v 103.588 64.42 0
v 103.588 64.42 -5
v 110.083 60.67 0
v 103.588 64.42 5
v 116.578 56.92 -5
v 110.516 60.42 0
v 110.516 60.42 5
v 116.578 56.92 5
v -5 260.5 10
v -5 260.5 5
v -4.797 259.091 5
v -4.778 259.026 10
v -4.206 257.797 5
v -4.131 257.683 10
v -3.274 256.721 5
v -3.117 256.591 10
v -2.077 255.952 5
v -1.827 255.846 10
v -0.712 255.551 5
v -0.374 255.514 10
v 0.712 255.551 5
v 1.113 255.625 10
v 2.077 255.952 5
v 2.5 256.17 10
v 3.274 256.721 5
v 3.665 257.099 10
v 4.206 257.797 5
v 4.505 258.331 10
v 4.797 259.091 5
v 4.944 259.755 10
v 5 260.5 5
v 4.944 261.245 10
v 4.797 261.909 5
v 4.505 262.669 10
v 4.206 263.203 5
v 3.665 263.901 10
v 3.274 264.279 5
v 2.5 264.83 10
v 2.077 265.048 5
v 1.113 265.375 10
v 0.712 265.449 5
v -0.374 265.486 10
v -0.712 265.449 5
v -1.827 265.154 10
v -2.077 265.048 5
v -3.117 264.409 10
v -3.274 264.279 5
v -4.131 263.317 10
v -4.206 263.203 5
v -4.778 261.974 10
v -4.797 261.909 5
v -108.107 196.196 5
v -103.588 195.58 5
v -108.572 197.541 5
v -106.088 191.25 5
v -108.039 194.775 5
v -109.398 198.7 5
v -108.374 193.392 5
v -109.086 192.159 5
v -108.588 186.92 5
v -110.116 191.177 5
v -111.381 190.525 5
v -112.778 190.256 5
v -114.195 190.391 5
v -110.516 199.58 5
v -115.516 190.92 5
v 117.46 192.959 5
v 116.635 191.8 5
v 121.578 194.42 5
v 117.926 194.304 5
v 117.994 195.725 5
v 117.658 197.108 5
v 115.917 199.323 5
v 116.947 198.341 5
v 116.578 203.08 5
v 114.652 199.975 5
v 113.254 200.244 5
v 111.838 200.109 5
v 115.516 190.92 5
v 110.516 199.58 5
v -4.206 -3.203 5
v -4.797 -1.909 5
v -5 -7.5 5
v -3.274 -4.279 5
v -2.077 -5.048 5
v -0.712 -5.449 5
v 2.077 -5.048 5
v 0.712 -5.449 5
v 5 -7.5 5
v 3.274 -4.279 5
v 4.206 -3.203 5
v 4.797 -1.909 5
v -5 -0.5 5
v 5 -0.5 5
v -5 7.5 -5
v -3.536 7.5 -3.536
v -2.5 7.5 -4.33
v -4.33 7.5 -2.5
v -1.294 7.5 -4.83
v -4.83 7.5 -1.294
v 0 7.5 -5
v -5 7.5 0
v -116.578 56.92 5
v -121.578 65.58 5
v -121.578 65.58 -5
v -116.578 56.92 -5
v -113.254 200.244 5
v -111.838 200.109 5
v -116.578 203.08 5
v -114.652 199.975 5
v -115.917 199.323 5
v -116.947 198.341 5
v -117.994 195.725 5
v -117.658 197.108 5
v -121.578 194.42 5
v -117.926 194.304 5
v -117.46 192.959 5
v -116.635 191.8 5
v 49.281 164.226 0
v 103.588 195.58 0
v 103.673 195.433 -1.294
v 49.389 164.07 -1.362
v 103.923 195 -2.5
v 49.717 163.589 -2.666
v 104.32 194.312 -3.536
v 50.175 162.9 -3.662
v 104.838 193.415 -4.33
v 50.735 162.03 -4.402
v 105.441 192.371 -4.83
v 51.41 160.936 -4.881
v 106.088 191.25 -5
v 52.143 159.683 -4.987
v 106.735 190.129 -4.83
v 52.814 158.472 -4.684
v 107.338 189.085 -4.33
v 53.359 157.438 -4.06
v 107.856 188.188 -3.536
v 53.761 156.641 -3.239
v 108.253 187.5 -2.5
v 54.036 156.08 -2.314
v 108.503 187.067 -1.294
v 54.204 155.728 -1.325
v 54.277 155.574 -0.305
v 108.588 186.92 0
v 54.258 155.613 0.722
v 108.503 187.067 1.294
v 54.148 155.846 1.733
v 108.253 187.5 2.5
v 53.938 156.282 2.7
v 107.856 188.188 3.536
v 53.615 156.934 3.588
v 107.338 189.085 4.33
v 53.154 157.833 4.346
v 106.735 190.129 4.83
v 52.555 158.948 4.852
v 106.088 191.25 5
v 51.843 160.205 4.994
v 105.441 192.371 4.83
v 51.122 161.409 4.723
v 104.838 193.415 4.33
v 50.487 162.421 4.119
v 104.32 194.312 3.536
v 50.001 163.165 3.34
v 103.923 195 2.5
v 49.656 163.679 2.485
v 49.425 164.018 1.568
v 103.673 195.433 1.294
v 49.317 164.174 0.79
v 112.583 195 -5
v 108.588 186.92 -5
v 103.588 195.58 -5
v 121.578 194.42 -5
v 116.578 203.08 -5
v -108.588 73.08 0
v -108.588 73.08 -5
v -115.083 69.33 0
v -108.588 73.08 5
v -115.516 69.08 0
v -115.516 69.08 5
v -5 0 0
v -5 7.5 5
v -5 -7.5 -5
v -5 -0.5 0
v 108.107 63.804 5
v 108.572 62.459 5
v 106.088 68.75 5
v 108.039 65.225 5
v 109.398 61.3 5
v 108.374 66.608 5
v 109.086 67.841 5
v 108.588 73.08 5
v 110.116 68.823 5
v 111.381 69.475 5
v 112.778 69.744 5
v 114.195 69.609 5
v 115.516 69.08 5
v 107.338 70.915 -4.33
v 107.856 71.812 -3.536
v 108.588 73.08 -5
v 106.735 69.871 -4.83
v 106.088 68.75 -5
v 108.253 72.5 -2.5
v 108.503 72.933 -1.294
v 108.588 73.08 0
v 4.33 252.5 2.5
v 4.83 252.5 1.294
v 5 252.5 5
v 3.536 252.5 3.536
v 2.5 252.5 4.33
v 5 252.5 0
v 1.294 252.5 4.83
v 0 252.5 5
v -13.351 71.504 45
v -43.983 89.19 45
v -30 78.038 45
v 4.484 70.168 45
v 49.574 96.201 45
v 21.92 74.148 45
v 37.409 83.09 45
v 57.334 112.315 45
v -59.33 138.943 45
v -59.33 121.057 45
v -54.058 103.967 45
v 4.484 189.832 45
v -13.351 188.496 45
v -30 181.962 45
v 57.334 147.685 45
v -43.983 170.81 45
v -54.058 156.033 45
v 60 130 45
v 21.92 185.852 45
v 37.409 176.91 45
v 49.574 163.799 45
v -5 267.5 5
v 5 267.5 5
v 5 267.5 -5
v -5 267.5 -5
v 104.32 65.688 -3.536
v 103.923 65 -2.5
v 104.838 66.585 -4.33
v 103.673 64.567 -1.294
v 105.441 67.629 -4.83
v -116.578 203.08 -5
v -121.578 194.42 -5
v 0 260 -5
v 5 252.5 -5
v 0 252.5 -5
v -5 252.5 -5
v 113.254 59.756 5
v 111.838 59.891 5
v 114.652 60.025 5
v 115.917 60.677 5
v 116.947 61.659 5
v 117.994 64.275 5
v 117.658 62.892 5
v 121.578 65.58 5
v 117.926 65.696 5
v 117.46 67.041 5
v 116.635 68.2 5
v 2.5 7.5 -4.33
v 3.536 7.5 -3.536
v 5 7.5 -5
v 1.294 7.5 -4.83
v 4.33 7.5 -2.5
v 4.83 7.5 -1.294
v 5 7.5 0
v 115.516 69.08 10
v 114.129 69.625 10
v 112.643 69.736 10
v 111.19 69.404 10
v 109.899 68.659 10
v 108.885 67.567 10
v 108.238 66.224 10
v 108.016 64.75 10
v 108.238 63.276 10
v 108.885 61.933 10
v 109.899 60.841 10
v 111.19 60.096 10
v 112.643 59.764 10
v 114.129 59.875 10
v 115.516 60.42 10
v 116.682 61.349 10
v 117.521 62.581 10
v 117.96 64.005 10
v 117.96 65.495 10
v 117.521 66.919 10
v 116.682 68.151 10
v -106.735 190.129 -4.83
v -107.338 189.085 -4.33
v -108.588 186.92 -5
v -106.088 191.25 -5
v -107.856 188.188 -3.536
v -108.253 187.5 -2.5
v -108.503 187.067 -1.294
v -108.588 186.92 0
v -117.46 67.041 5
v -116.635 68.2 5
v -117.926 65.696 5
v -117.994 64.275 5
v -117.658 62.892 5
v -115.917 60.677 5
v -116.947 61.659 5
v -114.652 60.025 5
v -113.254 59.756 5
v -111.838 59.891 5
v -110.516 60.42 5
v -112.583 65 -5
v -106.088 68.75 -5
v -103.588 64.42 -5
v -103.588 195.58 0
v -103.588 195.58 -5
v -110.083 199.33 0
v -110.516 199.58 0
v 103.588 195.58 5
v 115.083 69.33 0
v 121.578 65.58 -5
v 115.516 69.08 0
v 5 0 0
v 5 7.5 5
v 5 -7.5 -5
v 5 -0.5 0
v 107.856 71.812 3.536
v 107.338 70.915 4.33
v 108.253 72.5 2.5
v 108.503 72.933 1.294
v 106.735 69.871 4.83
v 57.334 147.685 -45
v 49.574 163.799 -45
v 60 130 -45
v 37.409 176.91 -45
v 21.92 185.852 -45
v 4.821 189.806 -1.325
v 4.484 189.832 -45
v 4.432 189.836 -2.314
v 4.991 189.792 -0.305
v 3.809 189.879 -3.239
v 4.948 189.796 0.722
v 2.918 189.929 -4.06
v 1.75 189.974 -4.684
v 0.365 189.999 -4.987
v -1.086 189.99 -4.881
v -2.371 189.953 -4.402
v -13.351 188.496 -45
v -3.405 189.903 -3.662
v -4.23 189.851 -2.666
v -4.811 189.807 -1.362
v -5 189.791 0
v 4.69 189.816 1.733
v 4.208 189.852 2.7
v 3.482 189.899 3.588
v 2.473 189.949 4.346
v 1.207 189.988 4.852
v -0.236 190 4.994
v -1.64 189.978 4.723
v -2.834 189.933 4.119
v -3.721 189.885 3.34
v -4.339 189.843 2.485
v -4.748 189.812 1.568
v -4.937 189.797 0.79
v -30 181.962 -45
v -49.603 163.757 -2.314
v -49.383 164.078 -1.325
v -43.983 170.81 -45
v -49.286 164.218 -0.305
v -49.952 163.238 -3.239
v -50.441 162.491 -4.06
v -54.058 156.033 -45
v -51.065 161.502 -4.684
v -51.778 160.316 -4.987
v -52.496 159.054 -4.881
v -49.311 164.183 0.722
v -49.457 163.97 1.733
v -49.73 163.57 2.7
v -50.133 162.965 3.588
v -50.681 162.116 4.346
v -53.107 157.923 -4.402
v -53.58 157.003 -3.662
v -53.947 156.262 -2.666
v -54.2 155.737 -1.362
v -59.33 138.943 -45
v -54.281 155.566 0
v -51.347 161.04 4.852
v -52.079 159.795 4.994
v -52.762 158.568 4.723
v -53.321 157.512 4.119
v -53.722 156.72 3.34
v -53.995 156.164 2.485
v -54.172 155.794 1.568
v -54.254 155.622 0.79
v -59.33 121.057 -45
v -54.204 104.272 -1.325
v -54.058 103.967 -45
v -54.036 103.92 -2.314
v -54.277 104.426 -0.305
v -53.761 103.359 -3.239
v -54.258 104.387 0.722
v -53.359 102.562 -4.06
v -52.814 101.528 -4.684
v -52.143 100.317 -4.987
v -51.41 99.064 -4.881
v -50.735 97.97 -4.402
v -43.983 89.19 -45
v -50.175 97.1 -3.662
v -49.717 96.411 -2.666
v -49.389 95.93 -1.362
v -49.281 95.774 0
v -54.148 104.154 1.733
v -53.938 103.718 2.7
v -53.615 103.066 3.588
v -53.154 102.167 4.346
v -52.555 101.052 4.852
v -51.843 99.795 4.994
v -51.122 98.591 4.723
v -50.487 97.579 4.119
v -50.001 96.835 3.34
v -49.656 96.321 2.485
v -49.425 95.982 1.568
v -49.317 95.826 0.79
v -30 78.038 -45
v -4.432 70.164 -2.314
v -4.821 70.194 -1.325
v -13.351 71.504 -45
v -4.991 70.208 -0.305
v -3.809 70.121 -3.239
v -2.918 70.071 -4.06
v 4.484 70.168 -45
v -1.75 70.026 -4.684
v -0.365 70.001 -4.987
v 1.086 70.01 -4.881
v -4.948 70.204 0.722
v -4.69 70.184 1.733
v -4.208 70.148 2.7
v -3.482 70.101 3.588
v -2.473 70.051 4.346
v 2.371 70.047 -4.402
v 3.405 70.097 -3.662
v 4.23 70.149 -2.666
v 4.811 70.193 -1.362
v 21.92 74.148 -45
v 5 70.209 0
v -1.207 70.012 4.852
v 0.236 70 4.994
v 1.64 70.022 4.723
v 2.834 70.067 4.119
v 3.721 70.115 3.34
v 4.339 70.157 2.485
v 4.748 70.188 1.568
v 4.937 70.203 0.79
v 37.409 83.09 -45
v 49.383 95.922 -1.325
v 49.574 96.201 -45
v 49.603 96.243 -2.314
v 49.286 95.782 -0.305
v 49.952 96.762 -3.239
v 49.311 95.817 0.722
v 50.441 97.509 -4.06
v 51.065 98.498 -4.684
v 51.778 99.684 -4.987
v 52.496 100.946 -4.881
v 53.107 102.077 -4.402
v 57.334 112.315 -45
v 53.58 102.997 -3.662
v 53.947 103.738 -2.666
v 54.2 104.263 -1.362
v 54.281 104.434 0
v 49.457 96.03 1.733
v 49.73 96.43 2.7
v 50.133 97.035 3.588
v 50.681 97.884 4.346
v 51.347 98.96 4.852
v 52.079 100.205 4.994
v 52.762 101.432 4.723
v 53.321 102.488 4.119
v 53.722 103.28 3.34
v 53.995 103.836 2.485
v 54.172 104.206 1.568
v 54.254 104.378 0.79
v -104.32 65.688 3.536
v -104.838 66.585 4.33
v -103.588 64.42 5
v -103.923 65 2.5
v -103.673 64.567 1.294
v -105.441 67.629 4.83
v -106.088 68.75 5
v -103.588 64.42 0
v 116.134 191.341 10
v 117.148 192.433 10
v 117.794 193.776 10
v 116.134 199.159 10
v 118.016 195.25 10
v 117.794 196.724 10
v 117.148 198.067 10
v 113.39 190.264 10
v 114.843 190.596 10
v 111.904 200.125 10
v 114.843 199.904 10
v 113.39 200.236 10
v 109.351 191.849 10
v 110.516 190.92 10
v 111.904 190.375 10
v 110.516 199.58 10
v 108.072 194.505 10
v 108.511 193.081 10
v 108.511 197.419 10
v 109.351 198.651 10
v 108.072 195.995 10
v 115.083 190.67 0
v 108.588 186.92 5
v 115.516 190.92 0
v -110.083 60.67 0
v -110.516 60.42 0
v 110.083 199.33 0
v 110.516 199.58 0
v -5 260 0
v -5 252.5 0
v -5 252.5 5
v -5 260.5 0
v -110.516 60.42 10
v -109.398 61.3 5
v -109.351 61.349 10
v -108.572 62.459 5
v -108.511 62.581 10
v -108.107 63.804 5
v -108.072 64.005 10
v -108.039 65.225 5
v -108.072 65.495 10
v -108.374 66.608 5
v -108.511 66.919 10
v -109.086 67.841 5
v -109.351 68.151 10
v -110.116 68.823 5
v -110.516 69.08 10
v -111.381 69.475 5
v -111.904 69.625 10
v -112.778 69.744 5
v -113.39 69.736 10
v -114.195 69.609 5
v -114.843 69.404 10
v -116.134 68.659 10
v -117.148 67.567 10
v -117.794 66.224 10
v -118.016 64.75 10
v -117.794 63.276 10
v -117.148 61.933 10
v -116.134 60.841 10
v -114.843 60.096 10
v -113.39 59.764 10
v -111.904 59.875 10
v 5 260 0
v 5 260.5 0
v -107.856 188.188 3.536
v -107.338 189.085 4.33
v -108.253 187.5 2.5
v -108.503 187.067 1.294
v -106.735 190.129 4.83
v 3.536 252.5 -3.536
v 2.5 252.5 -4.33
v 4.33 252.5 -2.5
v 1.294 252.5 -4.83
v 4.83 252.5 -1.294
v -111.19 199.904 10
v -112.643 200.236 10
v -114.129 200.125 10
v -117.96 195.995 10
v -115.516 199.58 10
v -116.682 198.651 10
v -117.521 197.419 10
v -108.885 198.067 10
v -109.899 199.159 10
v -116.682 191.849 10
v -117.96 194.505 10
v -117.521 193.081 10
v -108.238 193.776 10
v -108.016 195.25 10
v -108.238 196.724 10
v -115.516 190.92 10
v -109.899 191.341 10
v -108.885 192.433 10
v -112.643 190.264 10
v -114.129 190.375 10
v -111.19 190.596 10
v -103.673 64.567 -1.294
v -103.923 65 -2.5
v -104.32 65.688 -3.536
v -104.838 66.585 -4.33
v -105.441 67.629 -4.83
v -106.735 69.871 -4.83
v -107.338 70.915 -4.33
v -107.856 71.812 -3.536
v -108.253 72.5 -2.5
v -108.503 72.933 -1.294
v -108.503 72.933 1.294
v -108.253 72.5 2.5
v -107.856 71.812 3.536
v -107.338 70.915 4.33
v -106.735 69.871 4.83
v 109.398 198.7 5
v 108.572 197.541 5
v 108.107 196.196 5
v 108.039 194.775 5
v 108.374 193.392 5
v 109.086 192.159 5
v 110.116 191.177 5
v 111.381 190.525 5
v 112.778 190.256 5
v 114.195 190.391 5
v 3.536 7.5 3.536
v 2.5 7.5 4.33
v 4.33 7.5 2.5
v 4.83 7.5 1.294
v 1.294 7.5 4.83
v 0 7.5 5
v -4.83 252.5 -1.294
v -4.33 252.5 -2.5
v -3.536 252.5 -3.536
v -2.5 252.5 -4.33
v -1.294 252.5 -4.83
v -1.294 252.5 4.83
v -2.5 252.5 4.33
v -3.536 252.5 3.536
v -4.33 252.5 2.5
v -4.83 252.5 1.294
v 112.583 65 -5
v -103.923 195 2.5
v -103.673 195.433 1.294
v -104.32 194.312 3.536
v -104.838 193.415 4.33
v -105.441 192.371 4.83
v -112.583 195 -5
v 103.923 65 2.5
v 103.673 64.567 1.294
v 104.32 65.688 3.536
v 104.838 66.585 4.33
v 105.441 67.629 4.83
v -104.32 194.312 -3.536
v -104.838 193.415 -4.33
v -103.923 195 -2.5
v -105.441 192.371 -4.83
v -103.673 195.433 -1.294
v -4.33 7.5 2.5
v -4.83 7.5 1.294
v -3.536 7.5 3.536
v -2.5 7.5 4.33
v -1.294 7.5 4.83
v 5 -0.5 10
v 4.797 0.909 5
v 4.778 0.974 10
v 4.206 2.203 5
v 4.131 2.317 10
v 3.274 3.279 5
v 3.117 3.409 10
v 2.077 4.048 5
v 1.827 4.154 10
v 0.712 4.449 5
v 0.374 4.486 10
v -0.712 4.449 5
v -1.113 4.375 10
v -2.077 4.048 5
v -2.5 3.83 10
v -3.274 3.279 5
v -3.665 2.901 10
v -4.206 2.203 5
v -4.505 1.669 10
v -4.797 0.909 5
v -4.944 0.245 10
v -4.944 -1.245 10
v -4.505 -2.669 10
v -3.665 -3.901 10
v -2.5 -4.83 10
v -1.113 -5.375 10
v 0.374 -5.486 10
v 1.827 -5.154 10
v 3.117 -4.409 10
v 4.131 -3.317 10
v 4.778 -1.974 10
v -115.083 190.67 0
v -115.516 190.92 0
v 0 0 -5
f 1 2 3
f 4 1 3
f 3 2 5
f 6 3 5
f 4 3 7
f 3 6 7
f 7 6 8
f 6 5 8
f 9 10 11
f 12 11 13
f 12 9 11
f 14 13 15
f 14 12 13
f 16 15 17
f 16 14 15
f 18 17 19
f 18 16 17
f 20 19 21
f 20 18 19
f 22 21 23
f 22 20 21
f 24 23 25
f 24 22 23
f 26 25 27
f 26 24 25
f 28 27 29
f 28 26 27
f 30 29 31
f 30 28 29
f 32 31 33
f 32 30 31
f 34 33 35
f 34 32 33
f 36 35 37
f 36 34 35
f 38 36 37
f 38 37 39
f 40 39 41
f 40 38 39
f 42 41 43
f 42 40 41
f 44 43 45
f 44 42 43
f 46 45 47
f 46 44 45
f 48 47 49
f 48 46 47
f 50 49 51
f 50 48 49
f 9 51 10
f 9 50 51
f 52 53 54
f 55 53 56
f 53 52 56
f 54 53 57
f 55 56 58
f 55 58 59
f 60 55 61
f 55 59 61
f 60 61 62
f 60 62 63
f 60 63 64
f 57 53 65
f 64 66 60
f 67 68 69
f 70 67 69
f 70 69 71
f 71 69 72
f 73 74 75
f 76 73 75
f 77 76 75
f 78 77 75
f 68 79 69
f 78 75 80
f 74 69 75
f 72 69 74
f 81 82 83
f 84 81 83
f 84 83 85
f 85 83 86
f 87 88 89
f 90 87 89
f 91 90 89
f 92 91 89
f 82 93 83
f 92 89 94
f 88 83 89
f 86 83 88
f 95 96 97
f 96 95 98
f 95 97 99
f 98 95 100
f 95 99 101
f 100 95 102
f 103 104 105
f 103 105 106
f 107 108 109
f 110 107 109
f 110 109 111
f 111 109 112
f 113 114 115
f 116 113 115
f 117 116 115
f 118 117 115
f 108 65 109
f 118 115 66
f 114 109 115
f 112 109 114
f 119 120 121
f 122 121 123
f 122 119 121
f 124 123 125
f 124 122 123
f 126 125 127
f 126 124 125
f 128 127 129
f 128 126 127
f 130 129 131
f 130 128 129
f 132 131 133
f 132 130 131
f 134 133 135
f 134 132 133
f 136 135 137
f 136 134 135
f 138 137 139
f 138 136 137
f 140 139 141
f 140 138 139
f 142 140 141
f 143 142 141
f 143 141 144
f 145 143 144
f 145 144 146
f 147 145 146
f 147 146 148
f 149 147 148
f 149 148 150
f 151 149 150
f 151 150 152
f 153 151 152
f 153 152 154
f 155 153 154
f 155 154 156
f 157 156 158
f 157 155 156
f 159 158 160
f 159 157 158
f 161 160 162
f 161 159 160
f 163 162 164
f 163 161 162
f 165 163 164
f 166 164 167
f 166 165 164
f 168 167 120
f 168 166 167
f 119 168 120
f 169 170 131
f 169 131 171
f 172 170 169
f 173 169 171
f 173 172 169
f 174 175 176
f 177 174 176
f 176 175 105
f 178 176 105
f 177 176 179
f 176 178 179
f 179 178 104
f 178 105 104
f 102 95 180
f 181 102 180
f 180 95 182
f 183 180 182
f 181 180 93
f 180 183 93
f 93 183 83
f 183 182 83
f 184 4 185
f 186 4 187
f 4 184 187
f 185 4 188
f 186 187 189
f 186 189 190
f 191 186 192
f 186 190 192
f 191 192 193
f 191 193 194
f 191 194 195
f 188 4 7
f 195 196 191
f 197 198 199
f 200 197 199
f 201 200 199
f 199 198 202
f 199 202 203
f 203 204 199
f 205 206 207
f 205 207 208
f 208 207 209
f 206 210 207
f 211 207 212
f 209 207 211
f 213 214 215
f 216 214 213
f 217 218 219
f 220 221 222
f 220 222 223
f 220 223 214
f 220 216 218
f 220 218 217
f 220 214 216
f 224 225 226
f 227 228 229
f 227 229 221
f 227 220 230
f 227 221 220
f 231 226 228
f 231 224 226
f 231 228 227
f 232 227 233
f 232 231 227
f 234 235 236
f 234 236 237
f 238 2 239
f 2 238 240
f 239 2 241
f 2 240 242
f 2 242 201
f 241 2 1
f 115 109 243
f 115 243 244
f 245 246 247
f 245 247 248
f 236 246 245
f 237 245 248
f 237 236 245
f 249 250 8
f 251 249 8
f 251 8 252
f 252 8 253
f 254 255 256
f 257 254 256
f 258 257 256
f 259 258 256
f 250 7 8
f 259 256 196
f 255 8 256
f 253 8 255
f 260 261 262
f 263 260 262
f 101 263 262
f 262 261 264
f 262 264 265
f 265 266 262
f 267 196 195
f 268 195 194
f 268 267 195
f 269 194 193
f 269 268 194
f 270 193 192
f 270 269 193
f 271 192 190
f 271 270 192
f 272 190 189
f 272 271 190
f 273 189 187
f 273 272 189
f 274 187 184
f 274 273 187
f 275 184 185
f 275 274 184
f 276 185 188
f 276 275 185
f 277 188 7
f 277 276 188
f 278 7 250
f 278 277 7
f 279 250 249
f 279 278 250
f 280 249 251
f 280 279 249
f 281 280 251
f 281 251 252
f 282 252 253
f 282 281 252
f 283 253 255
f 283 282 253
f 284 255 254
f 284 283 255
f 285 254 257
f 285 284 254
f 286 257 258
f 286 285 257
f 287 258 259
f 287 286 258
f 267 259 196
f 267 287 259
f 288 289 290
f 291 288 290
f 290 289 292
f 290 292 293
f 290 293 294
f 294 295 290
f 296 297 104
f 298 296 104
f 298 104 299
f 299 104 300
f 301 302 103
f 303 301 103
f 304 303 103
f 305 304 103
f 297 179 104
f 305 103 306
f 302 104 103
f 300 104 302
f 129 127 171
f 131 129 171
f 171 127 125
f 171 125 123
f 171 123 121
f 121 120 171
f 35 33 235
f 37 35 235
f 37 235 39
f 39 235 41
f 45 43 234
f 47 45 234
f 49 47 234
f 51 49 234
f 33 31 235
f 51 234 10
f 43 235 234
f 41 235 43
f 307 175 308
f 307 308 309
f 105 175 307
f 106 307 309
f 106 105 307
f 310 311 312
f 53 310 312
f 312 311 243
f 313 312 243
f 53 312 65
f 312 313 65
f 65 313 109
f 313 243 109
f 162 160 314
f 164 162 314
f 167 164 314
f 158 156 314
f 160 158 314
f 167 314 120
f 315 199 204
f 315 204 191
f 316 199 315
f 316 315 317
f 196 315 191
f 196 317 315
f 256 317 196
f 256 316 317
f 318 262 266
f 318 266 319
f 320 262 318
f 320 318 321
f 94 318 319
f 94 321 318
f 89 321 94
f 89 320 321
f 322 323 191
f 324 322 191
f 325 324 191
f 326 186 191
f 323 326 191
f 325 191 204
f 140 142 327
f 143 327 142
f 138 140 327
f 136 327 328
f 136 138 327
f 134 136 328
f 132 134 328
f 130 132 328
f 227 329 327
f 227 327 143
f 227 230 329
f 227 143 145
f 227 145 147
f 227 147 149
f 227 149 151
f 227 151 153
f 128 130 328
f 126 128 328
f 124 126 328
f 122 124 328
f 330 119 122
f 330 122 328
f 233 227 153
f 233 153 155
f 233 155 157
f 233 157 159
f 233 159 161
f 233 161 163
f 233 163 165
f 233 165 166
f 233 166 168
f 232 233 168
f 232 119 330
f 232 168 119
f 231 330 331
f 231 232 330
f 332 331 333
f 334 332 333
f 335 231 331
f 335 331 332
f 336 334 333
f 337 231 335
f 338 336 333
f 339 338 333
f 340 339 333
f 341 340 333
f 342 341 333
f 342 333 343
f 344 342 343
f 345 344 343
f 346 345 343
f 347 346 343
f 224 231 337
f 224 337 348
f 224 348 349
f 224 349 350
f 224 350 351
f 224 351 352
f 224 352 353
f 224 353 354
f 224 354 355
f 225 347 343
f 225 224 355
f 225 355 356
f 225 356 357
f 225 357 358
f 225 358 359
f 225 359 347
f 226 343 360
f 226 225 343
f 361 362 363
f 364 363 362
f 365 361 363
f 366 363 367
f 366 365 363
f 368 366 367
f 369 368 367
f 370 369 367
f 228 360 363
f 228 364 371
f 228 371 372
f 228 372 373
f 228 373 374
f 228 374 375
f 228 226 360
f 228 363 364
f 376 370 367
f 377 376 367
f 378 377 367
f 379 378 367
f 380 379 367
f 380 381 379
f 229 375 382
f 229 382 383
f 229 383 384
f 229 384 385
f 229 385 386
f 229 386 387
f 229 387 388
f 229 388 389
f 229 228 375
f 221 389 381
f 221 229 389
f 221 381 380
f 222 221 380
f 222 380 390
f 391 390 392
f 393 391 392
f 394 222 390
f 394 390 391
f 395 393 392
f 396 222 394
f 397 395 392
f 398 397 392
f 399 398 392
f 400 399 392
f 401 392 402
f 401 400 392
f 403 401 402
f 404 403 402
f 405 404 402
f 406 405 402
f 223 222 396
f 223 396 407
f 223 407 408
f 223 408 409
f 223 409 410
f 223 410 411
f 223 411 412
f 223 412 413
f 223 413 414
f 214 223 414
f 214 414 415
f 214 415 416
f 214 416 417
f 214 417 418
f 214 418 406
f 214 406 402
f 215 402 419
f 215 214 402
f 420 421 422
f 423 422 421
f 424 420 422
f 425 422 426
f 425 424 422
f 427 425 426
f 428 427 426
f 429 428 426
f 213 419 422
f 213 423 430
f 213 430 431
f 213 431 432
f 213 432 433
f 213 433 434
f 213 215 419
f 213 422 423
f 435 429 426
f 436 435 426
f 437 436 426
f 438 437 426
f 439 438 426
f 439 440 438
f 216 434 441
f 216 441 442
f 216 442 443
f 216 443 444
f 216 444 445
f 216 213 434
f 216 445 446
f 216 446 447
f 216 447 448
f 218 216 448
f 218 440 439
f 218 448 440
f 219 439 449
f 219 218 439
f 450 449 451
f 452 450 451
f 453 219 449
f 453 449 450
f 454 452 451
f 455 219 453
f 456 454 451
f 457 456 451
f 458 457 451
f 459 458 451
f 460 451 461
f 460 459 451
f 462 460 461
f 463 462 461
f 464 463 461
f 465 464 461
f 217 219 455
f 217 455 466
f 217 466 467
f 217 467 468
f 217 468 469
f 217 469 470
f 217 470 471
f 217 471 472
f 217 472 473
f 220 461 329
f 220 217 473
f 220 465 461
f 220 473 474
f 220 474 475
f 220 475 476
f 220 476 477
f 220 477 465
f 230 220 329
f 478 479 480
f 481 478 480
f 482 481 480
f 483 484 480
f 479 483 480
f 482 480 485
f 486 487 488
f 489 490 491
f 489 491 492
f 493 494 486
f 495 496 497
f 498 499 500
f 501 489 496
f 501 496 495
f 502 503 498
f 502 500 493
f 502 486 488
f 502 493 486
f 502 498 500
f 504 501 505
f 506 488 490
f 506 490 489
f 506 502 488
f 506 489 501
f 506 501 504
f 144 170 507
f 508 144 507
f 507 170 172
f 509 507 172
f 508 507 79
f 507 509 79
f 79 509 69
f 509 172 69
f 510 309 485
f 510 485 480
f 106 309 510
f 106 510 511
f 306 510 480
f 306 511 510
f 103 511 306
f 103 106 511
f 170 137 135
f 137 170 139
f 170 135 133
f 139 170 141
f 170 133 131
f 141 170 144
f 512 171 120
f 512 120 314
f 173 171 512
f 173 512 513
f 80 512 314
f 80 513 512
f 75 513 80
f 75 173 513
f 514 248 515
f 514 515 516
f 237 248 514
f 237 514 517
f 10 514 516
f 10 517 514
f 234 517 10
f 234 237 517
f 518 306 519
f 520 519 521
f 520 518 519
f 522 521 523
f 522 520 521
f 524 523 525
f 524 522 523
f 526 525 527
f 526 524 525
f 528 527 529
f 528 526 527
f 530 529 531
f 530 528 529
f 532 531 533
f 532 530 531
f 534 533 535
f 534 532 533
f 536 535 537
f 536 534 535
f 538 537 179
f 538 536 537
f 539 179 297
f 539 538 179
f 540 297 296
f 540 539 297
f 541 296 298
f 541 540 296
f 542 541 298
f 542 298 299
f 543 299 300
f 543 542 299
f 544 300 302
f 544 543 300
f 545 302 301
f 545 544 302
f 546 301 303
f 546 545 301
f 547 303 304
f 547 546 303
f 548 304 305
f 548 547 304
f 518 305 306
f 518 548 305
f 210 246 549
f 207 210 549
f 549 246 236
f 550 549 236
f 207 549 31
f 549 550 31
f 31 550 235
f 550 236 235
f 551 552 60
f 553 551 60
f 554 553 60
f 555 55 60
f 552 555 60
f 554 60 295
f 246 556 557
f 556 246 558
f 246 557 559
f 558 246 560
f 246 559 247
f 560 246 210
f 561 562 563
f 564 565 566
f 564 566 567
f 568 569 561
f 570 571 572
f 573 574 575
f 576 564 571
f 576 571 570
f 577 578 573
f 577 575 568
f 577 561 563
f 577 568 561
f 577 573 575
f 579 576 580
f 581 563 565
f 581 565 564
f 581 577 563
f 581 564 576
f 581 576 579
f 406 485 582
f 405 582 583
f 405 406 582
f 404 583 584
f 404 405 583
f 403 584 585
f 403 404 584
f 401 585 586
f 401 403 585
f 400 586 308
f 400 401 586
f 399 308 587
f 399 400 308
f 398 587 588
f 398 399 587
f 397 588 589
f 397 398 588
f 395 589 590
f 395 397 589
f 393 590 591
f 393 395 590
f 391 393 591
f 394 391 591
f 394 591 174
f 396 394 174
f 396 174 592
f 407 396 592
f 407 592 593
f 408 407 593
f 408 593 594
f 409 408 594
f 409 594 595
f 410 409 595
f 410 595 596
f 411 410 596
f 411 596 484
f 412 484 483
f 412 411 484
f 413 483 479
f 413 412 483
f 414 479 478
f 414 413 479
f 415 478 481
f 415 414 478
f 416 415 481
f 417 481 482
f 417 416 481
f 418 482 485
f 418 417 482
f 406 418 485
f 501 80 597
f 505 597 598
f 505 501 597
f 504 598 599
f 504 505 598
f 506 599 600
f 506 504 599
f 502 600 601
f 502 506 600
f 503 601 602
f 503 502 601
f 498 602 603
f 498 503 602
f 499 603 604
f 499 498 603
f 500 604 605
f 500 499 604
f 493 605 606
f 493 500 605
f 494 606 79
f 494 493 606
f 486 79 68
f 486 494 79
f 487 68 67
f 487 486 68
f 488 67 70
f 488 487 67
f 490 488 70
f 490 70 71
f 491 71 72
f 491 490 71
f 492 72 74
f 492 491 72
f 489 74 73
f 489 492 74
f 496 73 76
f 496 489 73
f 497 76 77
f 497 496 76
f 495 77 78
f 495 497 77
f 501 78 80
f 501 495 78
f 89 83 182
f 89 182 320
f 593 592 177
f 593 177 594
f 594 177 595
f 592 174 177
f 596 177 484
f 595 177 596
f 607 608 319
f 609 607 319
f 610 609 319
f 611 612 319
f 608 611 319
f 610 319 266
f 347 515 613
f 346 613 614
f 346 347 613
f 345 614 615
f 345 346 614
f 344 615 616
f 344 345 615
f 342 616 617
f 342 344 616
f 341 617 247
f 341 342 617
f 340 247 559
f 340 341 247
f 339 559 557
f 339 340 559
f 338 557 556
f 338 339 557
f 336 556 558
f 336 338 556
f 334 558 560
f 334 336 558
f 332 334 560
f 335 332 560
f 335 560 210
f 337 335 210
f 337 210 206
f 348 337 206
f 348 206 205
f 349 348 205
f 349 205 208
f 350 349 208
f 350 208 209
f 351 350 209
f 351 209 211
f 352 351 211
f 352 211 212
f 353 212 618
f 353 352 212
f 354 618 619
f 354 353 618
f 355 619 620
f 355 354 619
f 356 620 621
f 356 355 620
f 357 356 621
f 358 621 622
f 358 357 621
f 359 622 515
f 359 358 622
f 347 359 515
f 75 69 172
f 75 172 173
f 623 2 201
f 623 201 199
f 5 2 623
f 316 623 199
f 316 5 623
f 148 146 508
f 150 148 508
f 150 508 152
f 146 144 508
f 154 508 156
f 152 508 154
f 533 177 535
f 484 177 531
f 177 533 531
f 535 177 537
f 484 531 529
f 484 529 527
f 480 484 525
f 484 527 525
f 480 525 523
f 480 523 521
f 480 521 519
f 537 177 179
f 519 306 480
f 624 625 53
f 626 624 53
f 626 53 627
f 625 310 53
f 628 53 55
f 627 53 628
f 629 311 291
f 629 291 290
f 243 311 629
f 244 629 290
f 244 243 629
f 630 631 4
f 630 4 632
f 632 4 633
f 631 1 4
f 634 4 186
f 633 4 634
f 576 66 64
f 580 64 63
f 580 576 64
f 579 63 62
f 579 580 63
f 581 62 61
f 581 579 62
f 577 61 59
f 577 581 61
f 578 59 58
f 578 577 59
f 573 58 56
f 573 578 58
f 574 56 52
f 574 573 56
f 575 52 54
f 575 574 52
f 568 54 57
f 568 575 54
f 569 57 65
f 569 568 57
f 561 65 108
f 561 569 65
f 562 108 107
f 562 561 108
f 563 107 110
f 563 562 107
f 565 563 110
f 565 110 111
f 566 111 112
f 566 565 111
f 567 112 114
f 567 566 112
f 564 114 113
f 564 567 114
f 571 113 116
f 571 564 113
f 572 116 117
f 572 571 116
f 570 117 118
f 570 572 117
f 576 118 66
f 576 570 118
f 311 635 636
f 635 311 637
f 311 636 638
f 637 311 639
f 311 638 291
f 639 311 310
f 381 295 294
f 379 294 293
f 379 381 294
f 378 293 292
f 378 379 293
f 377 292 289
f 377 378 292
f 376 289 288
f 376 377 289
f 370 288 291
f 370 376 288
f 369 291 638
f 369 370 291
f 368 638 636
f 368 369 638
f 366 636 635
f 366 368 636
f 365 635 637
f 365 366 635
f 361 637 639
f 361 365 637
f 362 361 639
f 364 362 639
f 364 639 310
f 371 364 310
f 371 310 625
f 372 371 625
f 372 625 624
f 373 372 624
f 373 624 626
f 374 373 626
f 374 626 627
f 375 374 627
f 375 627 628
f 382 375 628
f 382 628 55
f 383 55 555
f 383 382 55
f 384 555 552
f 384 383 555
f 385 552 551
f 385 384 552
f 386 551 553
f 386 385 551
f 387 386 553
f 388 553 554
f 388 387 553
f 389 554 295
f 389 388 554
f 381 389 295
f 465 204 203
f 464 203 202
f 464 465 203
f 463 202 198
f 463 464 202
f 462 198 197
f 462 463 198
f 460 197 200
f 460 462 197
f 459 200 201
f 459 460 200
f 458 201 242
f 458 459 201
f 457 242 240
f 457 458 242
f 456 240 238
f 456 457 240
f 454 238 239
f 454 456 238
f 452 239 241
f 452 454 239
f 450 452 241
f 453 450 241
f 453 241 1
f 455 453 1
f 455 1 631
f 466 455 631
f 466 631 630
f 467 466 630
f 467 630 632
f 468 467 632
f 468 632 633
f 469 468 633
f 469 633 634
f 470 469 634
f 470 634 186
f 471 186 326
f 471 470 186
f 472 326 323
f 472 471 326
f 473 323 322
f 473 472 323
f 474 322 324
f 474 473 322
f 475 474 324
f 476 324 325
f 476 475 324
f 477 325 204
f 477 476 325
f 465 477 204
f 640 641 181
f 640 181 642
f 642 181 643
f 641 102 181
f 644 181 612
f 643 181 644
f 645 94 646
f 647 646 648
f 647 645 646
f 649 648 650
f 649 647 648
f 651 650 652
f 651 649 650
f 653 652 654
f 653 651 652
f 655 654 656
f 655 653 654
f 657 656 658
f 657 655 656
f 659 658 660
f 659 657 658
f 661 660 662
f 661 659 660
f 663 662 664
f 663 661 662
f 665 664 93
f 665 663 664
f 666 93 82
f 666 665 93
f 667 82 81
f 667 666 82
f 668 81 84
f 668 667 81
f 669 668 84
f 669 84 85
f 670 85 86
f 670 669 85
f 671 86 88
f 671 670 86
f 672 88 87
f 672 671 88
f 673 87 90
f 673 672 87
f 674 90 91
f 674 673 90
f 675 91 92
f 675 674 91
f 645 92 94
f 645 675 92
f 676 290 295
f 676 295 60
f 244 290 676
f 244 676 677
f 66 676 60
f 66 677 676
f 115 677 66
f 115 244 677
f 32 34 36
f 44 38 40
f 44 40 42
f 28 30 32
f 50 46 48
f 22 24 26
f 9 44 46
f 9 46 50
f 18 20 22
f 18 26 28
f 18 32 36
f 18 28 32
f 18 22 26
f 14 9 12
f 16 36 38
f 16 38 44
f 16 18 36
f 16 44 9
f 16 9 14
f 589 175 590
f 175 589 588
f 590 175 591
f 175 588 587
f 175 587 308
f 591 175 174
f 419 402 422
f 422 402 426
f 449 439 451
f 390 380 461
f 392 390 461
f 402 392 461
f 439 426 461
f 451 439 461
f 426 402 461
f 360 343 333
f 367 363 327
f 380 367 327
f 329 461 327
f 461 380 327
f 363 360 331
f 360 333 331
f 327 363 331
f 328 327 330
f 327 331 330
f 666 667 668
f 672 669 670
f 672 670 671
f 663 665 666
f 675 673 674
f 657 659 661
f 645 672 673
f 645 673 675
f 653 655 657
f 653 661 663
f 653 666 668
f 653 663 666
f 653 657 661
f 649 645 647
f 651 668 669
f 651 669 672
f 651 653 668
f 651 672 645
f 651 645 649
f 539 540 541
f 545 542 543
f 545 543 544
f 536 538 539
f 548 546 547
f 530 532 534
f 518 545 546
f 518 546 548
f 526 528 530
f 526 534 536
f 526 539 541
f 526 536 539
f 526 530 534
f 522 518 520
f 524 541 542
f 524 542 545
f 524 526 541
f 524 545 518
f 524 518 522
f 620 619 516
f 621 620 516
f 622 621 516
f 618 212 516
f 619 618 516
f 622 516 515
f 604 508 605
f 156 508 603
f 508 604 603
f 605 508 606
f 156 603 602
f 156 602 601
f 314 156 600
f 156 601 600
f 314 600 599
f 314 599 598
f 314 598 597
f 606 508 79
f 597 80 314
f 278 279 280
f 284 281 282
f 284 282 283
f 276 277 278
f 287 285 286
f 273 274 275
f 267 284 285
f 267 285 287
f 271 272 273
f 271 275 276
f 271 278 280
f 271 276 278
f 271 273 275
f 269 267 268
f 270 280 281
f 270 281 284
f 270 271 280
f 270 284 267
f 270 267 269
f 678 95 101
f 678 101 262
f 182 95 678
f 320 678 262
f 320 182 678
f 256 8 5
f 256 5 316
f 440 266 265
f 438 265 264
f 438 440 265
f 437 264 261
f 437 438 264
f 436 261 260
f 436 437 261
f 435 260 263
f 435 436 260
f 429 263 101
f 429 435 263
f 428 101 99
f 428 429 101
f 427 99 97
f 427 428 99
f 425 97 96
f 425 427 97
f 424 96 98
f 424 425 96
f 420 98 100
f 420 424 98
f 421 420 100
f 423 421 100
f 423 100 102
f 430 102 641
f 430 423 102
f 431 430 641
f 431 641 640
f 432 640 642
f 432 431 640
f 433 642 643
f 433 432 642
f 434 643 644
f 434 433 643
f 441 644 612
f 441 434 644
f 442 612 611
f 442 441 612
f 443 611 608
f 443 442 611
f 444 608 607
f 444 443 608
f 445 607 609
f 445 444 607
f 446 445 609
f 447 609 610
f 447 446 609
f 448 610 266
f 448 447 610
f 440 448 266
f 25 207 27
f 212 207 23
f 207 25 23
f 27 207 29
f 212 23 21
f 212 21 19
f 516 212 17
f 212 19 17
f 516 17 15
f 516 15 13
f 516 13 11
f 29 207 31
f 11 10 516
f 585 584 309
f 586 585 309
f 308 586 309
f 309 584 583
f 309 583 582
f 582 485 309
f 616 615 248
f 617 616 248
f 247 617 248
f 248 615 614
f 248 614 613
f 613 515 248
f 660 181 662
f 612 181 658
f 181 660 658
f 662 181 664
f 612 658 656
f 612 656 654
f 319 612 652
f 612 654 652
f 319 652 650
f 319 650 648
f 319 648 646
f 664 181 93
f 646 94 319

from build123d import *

# Parameters (mm, degrees)
SKETCH_6_R               = 5
SKETCH_8_W               = 10
SKETCH_8_H               = 10
EXTRUDE_1_DEPTH          = 7.5
SKETCH_9_R               = 5
EXTRUDE_2_DEPTH          = 5
SKETCH_11_R              = 60
EXTRUDE_3_DEPTH          = 45
PATTERN_CIRCULAR_1_COUNT = 6


with BuildPart() as part:
    # 掃出1: sweep along a path in 草圖7
    with BuildLine(Plane.XY) as sweep_1_path:
        Line((0, 0), (0, 130))
    # 草圖6 → 掃出1 (sweep)
    with BuildSketch(Plane(origin=(0, 0, 0), x_dir=(1, 0, 0), z_dir=(0, 1, 0))):
        Circle(SKETCH_6_R)
    sweep_1 = sweep(path=sweep_1_path.line)

    # 草圖8 → 填料-伸長1 (add, symmetric)
    with BuildSketch(Plane.XZ):
        Rectangle(SKETCH_8_W, SKETCH_8_H)
    extrude_1 = extrude(amount=EXTRUDE_1_DEPTH, both=True)

    # 草圖9 → 填料-伸長2 (add, symmetric)
    with BuildSketch(Plane.XY.offset(5)):
        with Locations((0, -0.5)):
            Circle(SKETCH_9_R)
    extrude_2 = extrude(amount=EXTRUDE_2_DEPTH, both=True)

    # 草圖11 → 填料-伸長3 (add, symmetric)
    with BuildSketch(Plane.XY):
        with Locations((0, 130)):
            Circle(SKETCH_11_R)
    extrude(amount=EXTRUDE_3_DEPTH, both=True)

    # 環狀複製排列1: 掃出1, 填料-伸長1, 填料-伸長2 ×6 about axis
    pattern_circular_1_axis = Axis((0, 130, 0), (0, 0, 1))
    add([sweep_1.rotate(pattern_circular_1_axis, i * 360 / PATTERN_CIRCULAR_1_COUNT) for i in range(1, PATTERN_CIRCULAR_1_COUNT)])
    add([extrude_1.rotate(pattern_circular_1_axis, i * 360 / PATTERN_CIRCULAR_1_COUNT) for i in range(1, PATTERN_CIRCULAR_1_COUNT)])
    add([extrude_2.rotate(pattern_circular_1_axis, i * 360 / PATTERN_CIRCULAR_1_COUNT) for i in range(1, PATTERN_CIRCULAR_1_COUNT)])


solid = part.part
